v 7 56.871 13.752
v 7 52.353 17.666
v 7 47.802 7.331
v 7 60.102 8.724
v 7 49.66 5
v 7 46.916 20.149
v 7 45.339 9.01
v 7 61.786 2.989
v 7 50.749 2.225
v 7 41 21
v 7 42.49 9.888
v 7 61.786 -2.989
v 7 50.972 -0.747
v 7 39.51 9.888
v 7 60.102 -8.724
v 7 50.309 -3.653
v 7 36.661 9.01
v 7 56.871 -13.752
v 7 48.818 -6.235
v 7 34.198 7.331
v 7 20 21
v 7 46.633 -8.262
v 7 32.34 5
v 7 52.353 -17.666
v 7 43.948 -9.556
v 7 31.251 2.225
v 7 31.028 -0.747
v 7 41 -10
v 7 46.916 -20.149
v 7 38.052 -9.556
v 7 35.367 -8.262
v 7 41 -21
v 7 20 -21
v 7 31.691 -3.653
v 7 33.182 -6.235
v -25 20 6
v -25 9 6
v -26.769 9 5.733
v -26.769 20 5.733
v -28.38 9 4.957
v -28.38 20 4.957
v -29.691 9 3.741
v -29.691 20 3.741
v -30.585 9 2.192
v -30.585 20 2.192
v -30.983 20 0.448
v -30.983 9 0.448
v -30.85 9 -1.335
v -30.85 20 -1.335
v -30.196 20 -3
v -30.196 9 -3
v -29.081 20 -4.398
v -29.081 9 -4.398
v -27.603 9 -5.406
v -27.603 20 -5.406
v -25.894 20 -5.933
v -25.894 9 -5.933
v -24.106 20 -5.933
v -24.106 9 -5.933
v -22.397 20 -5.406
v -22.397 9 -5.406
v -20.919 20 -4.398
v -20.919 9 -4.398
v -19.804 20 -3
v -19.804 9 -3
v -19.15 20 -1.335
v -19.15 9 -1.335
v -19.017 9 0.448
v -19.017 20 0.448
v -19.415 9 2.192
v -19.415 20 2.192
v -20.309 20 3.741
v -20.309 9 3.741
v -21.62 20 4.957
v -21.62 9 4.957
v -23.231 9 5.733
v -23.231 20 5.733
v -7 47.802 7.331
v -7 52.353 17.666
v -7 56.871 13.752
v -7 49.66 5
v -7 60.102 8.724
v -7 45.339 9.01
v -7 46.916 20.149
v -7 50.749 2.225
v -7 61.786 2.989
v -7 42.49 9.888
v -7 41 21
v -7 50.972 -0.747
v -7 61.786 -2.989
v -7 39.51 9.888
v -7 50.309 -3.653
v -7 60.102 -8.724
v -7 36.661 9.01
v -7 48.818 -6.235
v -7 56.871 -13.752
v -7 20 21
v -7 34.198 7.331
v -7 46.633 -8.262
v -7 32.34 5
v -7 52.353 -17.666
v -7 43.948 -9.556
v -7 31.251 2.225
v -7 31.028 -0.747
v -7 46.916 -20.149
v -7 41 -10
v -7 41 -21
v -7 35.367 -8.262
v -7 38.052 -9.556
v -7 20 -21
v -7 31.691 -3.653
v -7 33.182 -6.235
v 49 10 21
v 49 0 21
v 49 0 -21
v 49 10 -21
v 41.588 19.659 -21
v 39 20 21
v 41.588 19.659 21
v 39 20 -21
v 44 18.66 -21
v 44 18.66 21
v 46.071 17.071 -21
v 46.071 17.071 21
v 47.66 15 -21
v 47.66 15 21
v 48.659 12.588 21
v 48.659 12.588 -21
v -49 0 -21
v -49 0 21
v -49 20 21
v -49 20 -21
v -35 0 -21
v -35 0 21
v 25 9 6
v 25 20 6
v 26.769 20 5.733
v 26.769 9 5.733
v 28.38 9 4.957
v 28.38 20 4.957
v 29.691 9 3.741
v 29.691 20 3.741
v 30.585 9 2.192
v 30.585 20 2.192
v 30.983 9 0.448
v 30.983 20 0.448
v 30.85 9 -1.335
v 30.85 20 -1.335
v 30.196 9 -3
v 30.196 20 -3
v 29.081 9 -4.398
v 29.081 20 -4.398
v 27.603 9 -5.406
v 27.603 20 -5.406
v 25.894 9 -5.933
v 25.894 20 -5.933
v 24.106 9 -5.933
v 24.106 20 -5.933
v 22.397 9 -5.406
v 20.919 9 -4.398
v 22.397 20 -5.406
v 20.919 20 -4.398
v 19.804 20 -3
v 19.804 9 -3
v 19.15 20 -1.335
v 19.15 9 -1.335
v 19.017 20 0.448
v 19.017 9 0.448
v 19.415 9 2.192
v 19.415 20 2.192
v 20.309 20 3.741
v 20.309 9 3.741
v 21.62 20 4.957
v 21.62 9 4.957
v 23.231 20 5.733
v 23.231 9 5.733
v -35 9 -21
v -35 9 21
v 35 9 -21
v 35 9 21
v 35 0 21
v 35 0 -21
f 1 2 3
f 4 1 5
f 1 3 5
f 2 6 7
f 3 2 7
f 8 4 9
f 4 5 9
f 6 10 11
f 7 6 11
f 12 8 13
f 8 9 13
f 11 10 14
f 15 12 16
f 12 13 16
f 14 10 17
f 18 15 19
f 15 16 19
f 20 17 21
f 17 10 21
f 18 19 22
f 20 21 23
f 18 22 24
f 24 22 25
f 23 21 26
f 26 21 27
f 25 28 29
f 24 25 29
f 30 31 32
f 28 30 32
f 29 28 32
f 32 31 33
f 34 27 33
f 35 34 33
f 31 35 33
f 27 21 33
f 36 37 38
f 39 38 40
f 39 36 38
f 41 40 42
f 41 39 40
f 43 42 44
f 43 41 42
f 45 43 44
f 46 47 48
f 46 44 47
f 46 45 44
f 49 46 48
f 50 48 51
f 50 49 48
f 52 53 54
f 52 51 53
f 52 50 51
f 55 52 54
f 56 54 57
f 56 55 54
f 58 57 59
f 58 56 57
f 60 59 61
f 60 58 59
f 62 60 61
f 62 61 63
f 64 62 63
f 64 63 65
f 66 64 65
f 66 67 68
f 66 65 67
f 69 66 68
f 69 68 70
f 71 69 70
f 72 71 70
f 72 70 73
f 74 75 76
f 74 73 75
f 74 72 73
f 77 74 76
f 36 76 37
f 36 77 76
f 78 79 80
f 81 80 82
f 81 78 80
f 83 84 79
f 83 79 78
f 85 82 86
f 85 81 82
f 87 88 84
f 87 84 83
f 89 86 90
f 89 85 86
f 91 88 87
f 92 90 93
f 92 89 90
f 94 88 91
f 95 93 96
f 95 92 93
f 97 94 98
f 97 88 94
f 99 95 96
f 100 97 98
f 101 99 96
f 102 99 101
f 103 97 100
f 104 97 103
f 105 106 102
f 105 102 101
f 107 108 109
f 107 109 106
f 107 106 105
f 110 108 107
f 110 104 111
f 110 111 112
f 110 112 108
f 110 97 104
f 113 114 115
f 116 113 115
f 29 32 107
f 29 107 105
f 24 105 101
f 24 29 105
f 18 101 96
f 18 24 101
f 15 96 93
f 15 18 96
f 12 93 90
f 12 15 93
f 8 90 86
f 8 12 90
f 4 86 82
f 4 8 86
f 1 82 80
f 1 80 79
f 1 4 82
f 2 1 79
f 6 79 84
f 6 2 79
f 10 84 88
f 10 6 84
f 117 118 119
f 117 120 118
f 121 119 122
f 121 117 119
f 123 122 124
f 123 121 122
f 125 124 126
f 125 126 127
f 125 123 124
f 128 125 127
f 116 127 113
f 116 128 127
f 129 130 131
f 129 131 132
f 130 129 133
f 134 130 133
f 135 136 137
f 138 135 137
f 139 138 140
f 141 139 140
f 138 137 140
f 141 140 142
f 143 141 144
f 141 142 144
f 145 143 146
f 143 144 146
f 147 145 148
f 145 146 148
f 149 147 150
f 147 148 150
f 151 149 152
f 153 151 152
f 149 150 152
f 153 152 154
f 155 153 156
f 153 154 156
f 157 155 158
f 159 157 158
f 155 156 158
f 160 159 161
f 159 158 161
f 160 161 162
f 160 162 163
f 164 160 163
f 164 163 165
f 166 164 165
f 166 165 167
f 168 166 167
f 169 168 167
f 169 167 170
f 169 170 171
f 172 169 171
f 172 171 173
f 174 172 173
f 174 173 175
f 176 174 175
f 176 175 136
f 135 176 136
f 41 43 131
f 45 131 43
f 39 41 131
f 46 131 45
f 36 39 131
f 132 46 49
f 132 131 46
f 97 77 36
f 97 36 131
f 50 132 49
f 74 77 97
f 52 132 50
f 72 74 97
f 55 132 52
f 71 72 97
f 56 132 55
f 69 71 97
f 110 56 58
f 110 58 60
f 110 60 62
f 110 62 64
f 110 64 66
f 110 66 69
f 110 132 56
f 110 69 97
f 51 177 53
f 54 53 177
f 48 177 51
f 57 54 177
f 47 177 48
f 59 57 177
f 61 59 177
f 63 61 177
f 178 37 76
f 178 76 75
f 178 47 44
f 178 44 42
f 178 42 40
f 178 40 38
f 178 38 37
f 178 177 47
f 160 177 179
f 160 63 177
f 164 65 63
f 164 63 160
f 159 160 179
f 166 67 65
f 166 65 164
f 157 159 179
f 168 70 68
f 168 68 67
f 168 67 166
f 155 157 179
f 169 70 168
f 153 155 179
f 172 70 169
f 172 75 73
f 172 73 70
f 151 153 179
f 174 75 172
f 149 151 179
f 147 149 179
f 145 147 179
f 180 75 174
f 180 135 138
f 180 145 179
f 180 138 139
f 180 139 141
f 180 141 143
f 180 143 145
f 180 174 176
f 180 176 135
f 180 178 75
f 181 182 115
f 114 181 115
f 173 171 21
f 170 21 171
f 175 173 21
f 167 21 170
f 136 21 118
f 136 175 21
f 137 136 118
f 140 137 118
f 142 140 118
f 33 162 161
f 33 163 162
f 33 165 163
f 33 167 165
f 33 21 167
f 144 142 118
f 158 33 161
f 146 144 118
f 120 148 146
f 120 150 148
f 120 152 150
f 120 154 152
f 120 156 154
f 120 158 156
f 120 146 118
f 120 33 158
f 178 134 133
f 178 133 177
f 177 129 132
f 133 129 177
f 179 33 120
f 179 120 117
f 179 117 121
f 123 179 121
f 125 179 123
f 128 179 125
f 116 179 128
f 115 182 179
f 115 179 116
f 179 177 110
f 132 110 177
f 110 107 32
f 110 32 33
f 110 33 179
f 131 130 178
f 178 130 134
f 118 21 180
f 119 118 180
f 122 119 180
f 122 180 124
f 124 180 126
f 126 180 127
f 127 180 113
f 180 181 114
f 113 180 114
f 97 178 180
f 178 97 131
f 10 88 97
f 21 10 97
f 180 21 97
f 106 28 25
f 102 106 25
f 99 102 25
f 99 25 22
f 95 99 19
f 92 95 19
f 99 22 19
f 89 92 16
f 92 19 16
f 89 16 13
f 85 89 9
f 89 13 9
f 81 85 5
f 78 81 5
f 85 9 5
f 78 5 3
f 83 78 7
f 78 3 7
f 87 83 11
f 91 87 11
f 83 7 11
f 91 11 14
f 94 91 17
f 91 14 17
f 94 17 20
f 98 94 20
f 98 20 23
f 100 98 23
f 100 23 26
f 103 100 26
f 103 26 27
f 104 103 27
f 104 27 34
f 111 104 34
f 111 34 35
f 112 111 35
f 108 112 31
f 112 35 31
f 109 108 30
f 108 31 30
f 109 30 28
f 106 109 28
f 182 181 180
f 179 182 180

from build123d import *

# Parameters (mm, degrees)
SKETCH1_W           = 98
SKETCH1_H           = 42
BOSS_EXTRUDE1_DEPTH = 20
SKETCH2_W           = 70
SKETCH2_H           = 9
CUT_EXTRUDE1_DEPTH  = 68.564783726
SKETCH3_W           = 14
SKETCH3_H           = 42
BOSS_EXTRUDE2_DEPTH = 21
SKETCH4_R           = 21
BOSS_EXTRUDE3_DEPTH = 14
SKETCH5_R           = 6
CUT_EXTRUDE2_DEPTH  = 68.867518004
FILLET3_R           = 10
SKETCH6_R           = 10
CUT_EXTRUDE3_DEPTH  = 14


with BuildPart() as part:
    # Sketch1 → Boss-Extrude1 (new body)
    with BuildSketch(Plane(origin=(0, 0, 0), x_dir=(1, 0, 0), z_dir=(0, 1, 0))):
        Rectangle(SKETCH1_W, SKETCH1_H)
    extrude(amount=BOSS_EXTRUDE1_DEPTH)

    # Sketch2 → Cut-Extrude1 (cut, through all)
    with BuildSketch(Plane.XY.offset(21)):
        with Locations((0, 4.5)):
            Rectangle(SKETCH2_W, SKETCH2_H)
    extrude(amount=-CUT_EXTRUDE1_DEPTH, mode=Mode.SUBTRACT)

    # Sketch3 → Boss-Extrude2 (add)
    with BuildSketch(Plane(origin=(0, 20, 0), x_dir=(1, 0, 0), z_dir=(0, 1, 0))):
        Rectangle(SKETCH3_W, SKETCH3_H)
    extrude(amount=BOSS_EXTRUDE2_DEPTH)

    # Sketch4 → Boss-Extrude3 (add)
    with BuildSketch(Plane(origin=(7, 0, 0), x_dir=(0, 0, -1), z_dir=(1, 0, 0))):
        with Locations((0, 41)):
            Circle(SKETCH4_R)
    extrude(amount=-BOSS_EXTRUDE3_DEPTH)

    # Sketch5 → Cut-Extrude2 (cut, through all)
    with BuildSketch(Plane(origin=(0, 20, 0), x_dir=(1, 0, 0), z_dir=(0, 1, 0))):
        with Locations(Location((25, 0, 0), (0, 0, 270))):
            Circle(SKETCH5_R)
    cut_extrude2 = extrude(amount=-CUT_EXTRUDE2_DEPTH, mode=Mode.SUBTRACT)

    # Mirror1: Cut-Extrude2 across plane
    add(cut_extrude2.mirror(Plane(origin=(0, 0, 0), x_dir=(0, 0, 1), z_dir=(1, 0, 0))), mode=Mode.SUBTRACT)

    # Fillet3
    fillet3_edges = [part.edges().sort_by_distance(p)[0] for p in [
        (49, 20, 0),
    ]]
    fillet(fillet3_edges, radius=FILLET3_R)

    # Sketch6 → Cut-Extrude3 (cut)
    with BuildSketch(Plane(origin=(7, 0, 0), x_dir=(0, 0, -1), z_dir=(1, 0, 0))):
        with Locations((0, 41)):
            Circle(SKETCH6_R)
    extrude(amount=-CUT_EXTRUDE3_DEPTH, mode=Mode.SUBTRACT)


solid = part.part
